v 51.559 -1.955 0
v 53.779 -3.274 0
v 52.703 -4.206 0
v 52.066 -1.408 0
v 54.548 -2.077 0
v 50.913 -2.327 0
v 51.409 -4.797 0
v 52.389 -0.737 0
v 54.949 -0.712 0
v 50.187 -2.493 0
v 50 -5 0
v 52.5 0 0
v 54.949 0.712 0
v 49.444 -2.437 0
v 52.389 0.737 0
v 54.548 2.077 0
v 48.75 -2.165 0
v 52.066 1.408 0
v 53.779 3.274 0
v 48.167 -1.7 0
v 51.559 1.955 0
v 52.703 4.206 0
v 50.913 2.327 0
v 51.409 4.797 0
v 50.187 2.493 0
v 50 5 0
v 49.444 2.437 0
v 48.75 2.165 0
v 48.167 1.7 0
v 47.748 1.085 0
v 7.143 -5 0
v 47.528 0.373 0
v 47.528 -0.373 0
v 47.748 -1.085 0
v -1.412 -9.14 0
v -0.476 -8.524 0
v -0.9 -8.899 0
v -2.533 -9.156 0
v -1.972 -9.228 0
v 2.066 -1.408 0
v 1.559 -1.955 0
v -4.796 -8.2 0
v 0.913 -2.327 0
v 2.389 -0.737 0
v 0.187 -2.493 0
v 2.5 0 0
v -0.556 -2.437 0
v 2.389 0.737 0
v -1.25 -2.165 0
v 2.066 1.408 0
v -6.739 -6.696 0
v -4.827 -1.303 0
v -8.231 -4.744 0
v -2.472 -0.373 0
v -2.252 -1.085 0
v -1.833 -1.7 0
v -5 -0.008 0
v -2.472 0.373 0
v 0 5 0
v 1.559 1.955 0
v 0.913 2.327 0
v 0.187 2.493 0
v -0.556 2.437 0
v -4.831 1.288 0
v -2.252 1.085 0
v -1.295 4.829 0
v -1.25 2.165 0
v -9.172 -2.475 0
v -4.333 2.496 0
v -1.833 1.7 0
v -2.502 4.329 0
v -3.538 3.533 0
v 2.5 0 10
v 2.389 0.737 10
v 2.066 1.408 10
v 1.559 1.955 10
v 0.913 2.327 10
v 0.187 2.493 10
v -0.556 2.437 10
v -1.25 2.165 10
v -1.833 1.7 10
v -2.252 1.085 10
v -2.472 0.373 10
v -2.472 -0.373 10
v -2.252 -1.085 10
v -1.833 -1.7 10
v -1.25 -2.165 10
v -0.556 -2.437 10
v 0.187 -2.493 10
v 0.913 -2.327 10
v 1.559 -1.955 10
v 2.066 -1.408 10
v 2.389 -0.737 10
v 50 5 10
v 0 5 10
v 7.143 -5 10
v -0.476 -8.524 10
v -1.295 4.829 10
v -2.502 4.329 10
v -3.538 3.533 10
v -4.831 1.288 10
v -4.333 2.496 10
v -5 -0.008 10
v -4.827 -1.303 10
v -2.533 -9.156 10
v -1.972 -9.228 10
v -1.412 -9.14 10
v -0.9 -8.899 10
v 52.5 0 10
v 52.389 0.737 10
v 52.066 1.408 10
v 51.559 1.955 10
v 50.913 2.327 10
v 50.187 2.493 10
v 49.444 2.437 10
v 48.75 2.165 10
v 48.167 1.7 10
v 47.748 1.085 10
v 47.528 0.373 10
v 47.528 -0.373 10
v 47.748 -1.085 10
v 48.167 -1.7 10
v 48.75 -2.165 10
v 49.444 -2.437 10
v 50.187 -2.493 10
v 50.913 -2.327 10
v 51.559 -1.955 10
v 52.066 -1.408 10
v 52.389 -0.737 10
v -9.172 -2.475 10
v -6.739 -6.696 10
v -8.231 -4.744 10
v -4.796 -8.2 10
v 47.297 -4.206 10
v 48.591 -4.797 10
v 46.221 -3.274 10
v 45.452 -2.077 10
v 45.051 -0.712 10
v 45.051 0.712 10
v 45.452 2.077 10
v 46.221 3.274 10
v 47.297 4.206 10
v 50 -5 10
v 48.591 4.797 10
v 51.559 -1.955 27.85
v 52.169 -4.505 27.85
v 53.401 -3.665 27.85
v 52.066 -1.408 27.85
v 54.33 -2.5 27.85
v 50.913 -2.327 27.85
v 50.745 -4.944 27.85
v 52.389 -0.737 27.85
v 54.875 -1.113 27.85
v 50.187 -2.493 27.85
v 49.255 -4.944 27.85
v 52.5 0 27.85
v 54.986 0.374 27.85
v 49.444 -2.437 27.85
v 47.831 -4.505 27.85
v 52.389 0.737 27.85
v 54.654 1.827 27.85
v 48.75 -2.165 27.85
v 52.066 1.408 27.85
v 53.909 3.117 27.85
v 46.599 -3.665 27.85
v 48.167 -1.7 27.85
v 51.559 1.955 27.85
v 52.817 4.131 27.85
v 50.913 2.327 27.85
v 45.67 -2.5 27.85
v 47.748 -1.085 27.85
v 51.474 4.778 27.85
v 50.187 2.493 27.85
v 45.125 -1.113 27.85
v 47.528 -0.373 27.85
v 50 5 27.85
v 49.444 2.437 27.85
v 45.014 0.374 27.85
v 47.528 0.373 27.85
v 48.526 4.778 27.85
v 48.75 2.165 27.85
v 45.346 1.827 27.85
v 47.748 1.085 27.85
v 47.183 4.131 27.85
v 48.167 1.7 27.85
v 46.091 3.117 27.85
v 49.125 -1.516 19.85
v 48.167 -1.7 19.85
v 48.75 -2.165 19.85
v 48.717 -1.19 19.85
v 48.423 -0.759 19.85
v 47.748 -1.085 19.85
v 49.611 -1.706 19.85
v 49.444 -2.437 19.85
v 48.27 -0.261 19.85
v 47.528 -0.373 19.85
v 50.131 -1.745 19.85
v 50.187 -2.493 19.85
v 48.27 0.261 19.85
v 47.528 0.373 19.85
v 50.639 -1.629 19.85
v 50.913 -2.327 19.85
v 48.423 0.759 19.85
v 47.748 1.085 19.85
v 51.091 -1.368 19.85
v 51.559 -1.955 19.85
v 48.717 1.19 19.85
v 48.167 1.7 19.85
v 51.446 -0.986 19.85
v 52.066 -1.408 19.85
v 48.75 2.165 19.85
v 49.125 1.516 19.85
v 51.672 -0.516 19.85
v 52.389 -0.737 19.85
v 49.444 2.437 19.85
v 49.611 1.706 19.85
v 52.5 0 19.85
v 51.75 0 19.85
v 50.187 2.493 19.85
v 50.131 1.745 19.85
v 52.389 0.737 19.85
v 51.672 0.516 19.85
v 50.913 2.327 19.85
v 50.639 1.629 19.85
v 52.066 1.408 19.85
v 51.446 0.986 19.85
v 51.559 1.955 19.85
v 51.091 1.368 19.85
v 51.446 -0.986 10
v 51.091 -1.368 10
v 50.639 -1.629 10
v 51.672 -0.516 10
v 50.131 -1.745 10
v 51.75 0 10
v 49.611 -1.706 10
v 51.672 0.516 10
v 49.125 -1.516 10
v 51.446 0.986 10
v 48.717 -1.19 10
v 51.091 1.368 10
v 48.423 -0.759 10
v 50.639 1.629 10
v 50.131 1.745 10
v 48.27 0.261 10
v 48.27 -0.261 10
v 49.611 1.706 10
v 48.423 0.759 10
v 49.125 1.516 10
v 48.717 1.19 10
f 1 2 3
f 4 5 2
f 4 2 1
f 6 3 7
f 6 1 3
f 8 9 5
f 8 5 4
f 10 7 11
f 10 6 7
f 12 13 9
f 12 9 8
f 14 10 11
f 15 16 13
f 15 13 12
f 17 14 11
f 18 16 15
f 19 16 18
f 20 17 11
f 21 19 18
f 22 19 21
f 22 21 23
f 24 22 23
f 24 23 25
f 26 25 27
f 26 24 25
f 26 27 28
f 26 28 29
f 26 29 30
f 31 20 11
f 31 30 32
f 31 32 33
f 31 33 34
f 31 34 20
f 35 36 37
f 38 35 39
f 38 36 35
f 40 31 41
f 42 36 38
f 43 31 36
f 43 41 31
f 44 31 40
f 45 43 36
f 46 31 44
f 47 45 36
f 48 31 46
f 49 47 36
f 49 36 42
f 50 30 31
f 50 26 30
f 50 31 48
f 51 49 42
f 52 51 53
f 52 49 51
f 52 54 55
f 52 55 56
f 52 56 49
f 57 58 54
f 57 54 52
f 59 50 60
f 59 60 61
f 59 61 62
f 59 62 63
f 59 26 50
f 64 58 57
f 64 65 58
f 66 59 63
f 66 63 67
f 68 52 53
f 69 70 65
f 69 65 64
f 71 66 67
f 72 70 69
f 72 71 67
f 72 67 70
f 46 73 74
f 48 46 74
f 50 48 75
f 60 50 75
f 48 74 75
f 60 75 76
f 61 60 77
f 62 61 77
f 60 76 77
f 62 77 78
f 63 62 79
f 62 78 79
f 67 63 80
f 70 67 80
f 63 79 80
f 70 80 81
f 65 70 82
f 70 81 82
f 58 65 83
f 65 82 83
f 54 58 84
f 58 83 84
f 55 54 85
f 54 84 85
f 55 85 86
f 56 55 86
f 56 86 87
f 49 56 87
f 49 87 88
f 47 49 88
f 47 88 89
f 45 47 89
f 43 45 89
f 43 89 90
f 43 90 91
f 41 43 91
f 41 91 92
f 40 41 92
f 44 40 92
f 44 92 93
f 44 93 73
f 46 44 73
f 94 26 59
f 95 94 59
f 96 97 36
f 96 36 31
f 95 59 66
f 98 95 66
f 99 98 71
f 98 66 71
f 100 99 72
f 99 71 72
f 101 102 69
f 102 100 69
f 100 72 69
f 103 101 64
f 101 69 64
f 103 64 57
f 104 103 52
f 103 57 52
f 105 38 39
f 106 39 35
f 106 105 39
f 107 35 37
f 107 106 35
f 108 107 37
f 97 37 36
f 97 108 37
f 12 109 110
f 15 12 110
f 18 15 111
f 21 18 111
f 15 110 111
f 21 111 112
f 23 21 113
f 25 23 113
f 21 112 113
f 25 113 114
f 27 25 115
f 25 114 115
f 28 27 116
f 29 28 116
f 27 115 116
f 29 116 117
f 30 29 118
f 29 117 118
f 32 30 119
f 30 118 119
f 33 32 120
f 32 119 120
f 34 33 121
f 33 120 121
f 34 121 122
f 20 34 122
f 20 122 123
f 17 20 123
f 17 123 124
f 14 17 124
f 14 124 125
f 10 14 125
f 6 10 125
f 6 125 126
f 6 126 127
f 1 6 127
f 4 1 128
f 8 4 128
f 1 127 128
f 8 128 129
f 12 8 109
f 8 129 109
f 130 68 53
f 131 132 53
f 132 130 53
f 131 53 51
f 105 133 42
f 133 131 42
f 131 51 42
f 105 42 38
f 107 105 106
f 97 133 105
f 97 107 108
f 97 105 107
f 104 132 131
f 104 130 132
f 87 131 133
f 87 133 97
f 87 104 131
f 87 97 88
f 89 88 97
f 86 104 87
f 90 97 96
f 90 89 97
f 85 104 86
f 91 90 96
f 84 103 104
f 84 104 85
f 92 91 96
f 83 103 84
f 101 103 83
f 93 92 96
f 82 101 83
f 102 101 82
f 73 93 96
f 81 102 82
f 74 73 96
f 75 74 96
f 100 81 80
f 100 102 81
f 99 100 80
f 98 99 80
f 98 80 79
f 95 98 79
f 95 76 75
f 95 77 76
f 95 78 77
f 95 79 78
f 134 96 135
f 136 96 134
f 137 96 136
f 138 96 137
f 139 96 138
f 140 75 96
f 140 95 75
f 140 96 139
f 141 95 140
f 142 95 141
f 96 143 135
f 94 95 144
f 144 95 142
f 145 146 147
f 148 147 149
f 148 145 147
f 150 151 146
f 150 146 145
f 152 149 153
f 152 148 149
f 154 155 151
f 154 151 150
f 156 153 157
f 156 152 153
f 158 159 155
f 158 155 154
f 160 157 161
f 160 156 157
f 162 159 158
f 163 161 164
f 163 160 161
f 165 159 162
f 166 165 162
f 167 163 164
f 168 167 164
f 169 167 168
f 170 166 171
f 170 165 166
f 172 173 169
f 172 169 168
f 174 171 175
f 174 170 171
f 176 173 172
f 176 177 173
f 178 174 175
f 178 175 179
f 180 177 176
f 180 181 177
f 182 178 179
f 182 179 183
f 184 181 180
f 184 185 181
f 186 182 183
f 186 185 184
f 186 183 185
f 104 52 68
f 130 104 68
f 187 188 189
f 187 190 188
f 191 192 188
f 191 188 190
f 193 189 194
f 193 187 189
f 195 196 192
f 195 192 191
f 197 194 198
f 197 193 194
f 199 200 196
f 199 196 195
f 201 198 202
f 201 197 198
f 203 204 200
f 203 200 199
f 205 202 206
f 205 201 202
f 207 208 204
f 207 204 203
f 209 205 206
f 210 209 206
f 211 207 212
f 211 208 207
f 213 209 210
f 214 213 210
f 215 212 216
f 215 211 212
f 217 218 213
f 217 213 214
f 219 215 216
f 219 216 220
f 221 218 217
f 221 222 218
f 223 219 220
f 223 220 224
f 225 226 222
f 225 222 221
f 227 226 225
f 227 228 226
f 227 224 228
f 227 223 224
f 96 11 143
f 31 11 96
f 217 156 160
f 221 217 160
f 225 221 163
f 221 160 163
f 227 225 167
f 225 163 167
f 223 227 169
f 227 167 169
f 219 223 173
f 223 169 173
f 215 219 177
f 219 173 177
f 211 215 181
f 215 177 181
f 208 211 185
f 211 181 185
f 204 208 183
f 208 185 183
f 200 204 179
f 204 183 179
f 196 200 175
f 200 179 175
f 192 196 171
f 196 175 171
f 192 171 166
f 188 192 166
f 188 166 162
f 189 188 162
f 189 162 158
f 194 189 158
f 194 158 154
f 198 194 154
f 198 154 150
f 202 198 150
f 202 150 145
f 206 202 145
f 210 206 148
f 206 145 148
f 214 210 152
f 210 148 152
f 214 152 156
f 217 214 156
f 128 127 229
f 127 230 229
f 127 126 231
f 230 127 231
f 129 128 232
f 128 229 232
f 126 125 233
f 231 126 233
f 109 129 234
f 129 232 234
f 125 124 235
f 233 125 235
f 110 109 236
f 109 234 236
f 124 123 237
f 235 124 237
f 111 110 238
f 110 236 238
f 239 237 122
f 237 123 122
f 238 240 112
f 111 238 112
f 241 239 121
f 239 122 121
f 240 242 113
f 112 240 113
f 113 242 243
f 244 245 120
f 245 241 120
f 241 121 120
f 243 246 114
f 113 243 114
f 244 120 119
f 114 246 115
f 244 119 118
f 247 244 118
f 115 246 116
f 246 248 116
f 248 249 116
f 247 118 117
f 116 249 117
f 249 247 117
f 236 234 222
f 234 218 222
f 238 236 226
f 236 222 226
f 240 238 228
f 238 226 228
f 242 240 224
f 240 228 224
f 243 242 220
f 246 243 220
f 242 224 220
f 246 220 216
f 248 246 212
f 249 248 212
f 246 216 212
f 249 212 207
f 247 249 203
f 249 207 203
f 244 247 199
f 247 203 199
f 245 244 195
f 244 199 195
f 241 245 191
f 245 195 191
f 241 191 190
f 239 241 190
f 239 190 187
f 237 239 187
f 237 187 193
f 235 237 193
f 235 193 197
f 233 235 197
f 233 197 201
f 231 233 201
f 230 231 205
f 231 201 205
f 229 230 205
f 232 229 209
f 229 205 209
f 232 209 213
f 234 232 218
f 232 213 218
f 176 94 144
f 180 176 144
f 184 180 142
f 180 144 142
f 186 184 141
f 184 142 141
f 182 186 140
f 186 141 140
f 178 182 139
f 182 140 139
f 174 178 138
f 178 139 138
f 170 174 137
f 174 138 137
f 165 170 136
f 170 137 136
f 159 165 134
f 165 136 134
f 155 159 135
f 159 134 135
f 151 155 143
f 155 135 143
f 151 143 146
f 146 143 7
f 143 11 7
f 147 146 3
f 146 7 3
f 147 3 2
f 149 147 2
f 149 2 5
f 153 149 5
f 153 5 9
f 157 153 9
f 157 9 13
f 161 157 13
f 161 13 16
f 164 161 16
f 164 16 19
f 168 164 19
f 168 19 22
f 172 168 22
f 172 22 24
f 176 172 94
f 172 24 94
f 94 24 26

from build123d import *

# Parameters (mm, degrees)
EXTRUDE_1_DEPTH     = 10
SKETCH_2_R          = 2.500000000000002
SKETCH_2_R_2        = 2.5
CUT_EXTRUDE_1_DEPTH = 10
SKETCH_4_R          = 4.999999999999997
EXTRUDE_2_DEPTH     = 17.85
EXTRUDE_START       = -10
EXTRUDE_3_DEPTH     = 10
FILLET_1_R          = 2
CHAMFER_START       = 4
CHAMFER_1_OUTLINE_W = 8.394855713999998
CHAMFER_1_OUTLINE_H = 10
CHAMFER_1_DEPTH     = 3.536622653
SKETCH_6_R          = 2.500000000000002
CUT_EXTRUDE_2_DEPTH = 8
SKETCH_8_R          = 1.7500000000000036
CUT_EXTRUDE_4_DEPTH = 0.85
SKETCH_9_R          = 1.7499999999999967
CUT_EXTRUDE_5_DEPTH = 23.000000000000007
CUT_EXTRUDE_START   = -3
CUT_EXTRUDE_6_DEPTH = 4
FILLET_2_R          = 1
EXTRUDE_4_DEPTH     = 4
SKETCH_12_R         = 2.5
EXTRUDE_5_DEPTH     = 4


with BuildPart() as part:
    # 草图1 → 凸台-拉伸1 (new body)
    with BuildSketch(Plane.XY):
        with BuildLine():
            Line((0, 5), (50, 5.000000000000001))
            ThreePointArc((50, 5.000000000000001), (55, 0), (50, -4.999999999999997))
            Line((50, -4.999999999999997), (0, -5))
            ThreePointArc((0, -5), (-5, 6.1e-16), (0, 5))
        make_face()
    extrude(amount=EXTRUDE_1_DEPTH)

    # 草图2 → 切除-拉伸1 (cut)
    with BuildSketch(Plane.XY.offset(10)):
        with Locations((50, 0)):
            Circle(SKETCH_2_R)
        Circle(SKETCH_2_R_2)
    extrude(amount=-CUT_EXTRUDE_1_DEPTH, mode=Mode.SUBTRACT)

    # 草图4 → 凸台-拉伸2 (add)
    with BuildSketch(Plane.XY.offset(10)):
        with Locations(Location((50, 0, 0), (0, 0, 90))):
            Circle(SKETCH_4_R)
    extrude(amount=EXTRUDE_2_DEPTH)

    # 草图5 → 凸台-拉伸3 (add)
    with BuildSketch(Plane.XY.offset(10).offset(EXTRUDE_START)):
        with BuildLine():
            Line((-9.171946933133274, -2.4749524148530857), (-4.827340491122777, -1.3026065341332034))
            ThreePointArc((-4.827340491122777, -1.3026065341332034), (-3.0403097974823012, -3.9694478627805583), (5.411e-14, -5))
            Line((5.411e-14, -5), (1.028e-13, -9.5))
            ThreePointArc((1.028e-13, -9.5), (-5.7765886152163715, -7.541950939283059), (-9.171946933133274, -2.4749524148530857))
        make_face()
    extrude(amount=EXTRUDE_3_DEPTH)

    # 圆角1
    fillet_1_edges = [part.edges().sort_by_distance(p)[0] for p in [
        (1.028e-13, -9.5, 5),
    ]]
    fillet(fillet_1_edges, radius=FILLET_1_R)

    # 倒角1: read off the stored shape, not the designer's step
    # 倒角1 outline → 倒角1 (add)
    with BuildSketch(Plane(origin=(0, 0, 0), x_dir=(0.9076430982816491, 0.41974278569343915, 0), z_dir=(0.41974278569343915, -0.9076430982816494, 0)).offset(CHAMFER_START)):
        with Locations((0.18755170199999993, 5)):
            Rectangle(CHAMFER_1_OUTLINE_W, CHAMFER_1_OUTLINE_H)
    extrude(amount=CHAMFER_1_DEPTH)

    # 草图6 → 切除-拉伸2 (cut)
    with BuildSketch(Plane.XY.offset(27.85)):
        with Locations((50, 0)):
            Circle(SKETCH_6_R)
    extrude(amount=-CUT_EXTRUDE_2_DEPTH, mode=Mode.SUBTRACT)

    # 草图8 → 切除-拉伸4 (cut)
    with BuildSketch(Plane.XY.offset(19.849999999999998)):
        with Locations((50, 0)):
            Circle(SKETCH_8_R)
    extrude(amount=-CUT_EXTRUDE_4_DEPTH, mode=Mode.SUBTRACT)

    # 草图9 → 切除-拉伸5 (cut)
    with BuildSketch(Plane.XY.offset(19)):
        with Locations((50, 0)):
            Circle(SKETCH_9_R)
    extrude(amount=-CUT_EXTRUDE_5_DEPTH, mode=Mode.SUBTRACT)

    # 草图10 → 切除-拉伸6 (cut)
    with BuildSketch(Plane(origin=(0, 0, 0), x_dir=(-1, 0, 0), z_dir=(0, 0, -1)).offset(CUT_EXTRUDE_START)):
        with BuildLine():
            Line((9.171946933133274, -2.474952414853084), (4.827340491122777, -1.3026065341332034))
            ThreePointArc((4.827340491122777, -1.3026065341332034), (-4.327921927110574, 2.503815447039879), (3.535533905932719, -3.535533905932756))
            Line((3.535533905932719, -3.535533905932756), (6.717514421272165, -6.717514421272236))
            ThreePointArc((6.717514421272165, -6.717514421272236), (8.223051661510087, -4.757249349375768), (9.171946933133274, -2.474952414853084))
        make_face()
    extrude(amount=-CUT_EXTRUDE_6_DEPTH, mode=Mode.SUBTRACT)

    # 圆角2
    fillet_2_edges = [part.edges().sort_by_distance(p)[0] for p in [
        (-3.1e-16, 5, 5),
    ]]
    fillet(fillet_2_edges, radius=FILLET_2_R)

    # 草图11 → 凸台-拉伸4 (add)
    with BuildSketch(Plane.XY.offset(3)):
        with BuildLine():
            Line((-3.5355339059327213, -3.535533905932754), (-8.205808816608519, -4.78693029667969))
            ThreePointArc((-8.205808816608519, -4.78693029667969), (-7.523840965962772, -5.800156646065724), (-6.717514421272165, -6.717514421272236))
            Line((-6.717514421272165, -6.717514421272236), (-3.5355339059327213, -3.535533905932754))
        make_face()
    extrude(amount=EXTRUDE_4_DEPTH)

    # 草图12 → 凸台-拉伸5 (add)
    with BuildSketch(Plane.XY.offset(3)):
        with BuildLine():
            Line((-8.205808816608517, -4.786930296679689), (-3.5355339059327213, -3.535533905932754))
            ThreePointArc((-3.5355339059327213, -3.535533905932754), (3.435764551188546, -3.632564101126939), (3.726779962499649, 3.3333333333333344))
            ThreePointArc((3.726779962499649, 3.3333333333333344), (3.559265025824303, 4.408248290463864), (4.47213595499958, 5))
            Line((4.47213595499958, 5), (0, 5))
            ThreePointArc((0, 5), (-3.96944786278054, 3.0403097974823226), (-4.827340491122777, -1.3026065341332023))
            Line((-4.827340491122777, -1.3026065341332023), (-9.171946933133274, -2.474952414853084))
            ThreePointArc((-9.171946933133274, -2.474952414853084), (-8.765438332219034, -3.66293473106813), (-8.205808816608517, -4.786930296679689))
        make_face()
        Circle(SKETCH_12_R, mode=Mode.SUBTRACT)
    extrude(amount=EXTRUDE_5_DEPTH)


solid = part.part
